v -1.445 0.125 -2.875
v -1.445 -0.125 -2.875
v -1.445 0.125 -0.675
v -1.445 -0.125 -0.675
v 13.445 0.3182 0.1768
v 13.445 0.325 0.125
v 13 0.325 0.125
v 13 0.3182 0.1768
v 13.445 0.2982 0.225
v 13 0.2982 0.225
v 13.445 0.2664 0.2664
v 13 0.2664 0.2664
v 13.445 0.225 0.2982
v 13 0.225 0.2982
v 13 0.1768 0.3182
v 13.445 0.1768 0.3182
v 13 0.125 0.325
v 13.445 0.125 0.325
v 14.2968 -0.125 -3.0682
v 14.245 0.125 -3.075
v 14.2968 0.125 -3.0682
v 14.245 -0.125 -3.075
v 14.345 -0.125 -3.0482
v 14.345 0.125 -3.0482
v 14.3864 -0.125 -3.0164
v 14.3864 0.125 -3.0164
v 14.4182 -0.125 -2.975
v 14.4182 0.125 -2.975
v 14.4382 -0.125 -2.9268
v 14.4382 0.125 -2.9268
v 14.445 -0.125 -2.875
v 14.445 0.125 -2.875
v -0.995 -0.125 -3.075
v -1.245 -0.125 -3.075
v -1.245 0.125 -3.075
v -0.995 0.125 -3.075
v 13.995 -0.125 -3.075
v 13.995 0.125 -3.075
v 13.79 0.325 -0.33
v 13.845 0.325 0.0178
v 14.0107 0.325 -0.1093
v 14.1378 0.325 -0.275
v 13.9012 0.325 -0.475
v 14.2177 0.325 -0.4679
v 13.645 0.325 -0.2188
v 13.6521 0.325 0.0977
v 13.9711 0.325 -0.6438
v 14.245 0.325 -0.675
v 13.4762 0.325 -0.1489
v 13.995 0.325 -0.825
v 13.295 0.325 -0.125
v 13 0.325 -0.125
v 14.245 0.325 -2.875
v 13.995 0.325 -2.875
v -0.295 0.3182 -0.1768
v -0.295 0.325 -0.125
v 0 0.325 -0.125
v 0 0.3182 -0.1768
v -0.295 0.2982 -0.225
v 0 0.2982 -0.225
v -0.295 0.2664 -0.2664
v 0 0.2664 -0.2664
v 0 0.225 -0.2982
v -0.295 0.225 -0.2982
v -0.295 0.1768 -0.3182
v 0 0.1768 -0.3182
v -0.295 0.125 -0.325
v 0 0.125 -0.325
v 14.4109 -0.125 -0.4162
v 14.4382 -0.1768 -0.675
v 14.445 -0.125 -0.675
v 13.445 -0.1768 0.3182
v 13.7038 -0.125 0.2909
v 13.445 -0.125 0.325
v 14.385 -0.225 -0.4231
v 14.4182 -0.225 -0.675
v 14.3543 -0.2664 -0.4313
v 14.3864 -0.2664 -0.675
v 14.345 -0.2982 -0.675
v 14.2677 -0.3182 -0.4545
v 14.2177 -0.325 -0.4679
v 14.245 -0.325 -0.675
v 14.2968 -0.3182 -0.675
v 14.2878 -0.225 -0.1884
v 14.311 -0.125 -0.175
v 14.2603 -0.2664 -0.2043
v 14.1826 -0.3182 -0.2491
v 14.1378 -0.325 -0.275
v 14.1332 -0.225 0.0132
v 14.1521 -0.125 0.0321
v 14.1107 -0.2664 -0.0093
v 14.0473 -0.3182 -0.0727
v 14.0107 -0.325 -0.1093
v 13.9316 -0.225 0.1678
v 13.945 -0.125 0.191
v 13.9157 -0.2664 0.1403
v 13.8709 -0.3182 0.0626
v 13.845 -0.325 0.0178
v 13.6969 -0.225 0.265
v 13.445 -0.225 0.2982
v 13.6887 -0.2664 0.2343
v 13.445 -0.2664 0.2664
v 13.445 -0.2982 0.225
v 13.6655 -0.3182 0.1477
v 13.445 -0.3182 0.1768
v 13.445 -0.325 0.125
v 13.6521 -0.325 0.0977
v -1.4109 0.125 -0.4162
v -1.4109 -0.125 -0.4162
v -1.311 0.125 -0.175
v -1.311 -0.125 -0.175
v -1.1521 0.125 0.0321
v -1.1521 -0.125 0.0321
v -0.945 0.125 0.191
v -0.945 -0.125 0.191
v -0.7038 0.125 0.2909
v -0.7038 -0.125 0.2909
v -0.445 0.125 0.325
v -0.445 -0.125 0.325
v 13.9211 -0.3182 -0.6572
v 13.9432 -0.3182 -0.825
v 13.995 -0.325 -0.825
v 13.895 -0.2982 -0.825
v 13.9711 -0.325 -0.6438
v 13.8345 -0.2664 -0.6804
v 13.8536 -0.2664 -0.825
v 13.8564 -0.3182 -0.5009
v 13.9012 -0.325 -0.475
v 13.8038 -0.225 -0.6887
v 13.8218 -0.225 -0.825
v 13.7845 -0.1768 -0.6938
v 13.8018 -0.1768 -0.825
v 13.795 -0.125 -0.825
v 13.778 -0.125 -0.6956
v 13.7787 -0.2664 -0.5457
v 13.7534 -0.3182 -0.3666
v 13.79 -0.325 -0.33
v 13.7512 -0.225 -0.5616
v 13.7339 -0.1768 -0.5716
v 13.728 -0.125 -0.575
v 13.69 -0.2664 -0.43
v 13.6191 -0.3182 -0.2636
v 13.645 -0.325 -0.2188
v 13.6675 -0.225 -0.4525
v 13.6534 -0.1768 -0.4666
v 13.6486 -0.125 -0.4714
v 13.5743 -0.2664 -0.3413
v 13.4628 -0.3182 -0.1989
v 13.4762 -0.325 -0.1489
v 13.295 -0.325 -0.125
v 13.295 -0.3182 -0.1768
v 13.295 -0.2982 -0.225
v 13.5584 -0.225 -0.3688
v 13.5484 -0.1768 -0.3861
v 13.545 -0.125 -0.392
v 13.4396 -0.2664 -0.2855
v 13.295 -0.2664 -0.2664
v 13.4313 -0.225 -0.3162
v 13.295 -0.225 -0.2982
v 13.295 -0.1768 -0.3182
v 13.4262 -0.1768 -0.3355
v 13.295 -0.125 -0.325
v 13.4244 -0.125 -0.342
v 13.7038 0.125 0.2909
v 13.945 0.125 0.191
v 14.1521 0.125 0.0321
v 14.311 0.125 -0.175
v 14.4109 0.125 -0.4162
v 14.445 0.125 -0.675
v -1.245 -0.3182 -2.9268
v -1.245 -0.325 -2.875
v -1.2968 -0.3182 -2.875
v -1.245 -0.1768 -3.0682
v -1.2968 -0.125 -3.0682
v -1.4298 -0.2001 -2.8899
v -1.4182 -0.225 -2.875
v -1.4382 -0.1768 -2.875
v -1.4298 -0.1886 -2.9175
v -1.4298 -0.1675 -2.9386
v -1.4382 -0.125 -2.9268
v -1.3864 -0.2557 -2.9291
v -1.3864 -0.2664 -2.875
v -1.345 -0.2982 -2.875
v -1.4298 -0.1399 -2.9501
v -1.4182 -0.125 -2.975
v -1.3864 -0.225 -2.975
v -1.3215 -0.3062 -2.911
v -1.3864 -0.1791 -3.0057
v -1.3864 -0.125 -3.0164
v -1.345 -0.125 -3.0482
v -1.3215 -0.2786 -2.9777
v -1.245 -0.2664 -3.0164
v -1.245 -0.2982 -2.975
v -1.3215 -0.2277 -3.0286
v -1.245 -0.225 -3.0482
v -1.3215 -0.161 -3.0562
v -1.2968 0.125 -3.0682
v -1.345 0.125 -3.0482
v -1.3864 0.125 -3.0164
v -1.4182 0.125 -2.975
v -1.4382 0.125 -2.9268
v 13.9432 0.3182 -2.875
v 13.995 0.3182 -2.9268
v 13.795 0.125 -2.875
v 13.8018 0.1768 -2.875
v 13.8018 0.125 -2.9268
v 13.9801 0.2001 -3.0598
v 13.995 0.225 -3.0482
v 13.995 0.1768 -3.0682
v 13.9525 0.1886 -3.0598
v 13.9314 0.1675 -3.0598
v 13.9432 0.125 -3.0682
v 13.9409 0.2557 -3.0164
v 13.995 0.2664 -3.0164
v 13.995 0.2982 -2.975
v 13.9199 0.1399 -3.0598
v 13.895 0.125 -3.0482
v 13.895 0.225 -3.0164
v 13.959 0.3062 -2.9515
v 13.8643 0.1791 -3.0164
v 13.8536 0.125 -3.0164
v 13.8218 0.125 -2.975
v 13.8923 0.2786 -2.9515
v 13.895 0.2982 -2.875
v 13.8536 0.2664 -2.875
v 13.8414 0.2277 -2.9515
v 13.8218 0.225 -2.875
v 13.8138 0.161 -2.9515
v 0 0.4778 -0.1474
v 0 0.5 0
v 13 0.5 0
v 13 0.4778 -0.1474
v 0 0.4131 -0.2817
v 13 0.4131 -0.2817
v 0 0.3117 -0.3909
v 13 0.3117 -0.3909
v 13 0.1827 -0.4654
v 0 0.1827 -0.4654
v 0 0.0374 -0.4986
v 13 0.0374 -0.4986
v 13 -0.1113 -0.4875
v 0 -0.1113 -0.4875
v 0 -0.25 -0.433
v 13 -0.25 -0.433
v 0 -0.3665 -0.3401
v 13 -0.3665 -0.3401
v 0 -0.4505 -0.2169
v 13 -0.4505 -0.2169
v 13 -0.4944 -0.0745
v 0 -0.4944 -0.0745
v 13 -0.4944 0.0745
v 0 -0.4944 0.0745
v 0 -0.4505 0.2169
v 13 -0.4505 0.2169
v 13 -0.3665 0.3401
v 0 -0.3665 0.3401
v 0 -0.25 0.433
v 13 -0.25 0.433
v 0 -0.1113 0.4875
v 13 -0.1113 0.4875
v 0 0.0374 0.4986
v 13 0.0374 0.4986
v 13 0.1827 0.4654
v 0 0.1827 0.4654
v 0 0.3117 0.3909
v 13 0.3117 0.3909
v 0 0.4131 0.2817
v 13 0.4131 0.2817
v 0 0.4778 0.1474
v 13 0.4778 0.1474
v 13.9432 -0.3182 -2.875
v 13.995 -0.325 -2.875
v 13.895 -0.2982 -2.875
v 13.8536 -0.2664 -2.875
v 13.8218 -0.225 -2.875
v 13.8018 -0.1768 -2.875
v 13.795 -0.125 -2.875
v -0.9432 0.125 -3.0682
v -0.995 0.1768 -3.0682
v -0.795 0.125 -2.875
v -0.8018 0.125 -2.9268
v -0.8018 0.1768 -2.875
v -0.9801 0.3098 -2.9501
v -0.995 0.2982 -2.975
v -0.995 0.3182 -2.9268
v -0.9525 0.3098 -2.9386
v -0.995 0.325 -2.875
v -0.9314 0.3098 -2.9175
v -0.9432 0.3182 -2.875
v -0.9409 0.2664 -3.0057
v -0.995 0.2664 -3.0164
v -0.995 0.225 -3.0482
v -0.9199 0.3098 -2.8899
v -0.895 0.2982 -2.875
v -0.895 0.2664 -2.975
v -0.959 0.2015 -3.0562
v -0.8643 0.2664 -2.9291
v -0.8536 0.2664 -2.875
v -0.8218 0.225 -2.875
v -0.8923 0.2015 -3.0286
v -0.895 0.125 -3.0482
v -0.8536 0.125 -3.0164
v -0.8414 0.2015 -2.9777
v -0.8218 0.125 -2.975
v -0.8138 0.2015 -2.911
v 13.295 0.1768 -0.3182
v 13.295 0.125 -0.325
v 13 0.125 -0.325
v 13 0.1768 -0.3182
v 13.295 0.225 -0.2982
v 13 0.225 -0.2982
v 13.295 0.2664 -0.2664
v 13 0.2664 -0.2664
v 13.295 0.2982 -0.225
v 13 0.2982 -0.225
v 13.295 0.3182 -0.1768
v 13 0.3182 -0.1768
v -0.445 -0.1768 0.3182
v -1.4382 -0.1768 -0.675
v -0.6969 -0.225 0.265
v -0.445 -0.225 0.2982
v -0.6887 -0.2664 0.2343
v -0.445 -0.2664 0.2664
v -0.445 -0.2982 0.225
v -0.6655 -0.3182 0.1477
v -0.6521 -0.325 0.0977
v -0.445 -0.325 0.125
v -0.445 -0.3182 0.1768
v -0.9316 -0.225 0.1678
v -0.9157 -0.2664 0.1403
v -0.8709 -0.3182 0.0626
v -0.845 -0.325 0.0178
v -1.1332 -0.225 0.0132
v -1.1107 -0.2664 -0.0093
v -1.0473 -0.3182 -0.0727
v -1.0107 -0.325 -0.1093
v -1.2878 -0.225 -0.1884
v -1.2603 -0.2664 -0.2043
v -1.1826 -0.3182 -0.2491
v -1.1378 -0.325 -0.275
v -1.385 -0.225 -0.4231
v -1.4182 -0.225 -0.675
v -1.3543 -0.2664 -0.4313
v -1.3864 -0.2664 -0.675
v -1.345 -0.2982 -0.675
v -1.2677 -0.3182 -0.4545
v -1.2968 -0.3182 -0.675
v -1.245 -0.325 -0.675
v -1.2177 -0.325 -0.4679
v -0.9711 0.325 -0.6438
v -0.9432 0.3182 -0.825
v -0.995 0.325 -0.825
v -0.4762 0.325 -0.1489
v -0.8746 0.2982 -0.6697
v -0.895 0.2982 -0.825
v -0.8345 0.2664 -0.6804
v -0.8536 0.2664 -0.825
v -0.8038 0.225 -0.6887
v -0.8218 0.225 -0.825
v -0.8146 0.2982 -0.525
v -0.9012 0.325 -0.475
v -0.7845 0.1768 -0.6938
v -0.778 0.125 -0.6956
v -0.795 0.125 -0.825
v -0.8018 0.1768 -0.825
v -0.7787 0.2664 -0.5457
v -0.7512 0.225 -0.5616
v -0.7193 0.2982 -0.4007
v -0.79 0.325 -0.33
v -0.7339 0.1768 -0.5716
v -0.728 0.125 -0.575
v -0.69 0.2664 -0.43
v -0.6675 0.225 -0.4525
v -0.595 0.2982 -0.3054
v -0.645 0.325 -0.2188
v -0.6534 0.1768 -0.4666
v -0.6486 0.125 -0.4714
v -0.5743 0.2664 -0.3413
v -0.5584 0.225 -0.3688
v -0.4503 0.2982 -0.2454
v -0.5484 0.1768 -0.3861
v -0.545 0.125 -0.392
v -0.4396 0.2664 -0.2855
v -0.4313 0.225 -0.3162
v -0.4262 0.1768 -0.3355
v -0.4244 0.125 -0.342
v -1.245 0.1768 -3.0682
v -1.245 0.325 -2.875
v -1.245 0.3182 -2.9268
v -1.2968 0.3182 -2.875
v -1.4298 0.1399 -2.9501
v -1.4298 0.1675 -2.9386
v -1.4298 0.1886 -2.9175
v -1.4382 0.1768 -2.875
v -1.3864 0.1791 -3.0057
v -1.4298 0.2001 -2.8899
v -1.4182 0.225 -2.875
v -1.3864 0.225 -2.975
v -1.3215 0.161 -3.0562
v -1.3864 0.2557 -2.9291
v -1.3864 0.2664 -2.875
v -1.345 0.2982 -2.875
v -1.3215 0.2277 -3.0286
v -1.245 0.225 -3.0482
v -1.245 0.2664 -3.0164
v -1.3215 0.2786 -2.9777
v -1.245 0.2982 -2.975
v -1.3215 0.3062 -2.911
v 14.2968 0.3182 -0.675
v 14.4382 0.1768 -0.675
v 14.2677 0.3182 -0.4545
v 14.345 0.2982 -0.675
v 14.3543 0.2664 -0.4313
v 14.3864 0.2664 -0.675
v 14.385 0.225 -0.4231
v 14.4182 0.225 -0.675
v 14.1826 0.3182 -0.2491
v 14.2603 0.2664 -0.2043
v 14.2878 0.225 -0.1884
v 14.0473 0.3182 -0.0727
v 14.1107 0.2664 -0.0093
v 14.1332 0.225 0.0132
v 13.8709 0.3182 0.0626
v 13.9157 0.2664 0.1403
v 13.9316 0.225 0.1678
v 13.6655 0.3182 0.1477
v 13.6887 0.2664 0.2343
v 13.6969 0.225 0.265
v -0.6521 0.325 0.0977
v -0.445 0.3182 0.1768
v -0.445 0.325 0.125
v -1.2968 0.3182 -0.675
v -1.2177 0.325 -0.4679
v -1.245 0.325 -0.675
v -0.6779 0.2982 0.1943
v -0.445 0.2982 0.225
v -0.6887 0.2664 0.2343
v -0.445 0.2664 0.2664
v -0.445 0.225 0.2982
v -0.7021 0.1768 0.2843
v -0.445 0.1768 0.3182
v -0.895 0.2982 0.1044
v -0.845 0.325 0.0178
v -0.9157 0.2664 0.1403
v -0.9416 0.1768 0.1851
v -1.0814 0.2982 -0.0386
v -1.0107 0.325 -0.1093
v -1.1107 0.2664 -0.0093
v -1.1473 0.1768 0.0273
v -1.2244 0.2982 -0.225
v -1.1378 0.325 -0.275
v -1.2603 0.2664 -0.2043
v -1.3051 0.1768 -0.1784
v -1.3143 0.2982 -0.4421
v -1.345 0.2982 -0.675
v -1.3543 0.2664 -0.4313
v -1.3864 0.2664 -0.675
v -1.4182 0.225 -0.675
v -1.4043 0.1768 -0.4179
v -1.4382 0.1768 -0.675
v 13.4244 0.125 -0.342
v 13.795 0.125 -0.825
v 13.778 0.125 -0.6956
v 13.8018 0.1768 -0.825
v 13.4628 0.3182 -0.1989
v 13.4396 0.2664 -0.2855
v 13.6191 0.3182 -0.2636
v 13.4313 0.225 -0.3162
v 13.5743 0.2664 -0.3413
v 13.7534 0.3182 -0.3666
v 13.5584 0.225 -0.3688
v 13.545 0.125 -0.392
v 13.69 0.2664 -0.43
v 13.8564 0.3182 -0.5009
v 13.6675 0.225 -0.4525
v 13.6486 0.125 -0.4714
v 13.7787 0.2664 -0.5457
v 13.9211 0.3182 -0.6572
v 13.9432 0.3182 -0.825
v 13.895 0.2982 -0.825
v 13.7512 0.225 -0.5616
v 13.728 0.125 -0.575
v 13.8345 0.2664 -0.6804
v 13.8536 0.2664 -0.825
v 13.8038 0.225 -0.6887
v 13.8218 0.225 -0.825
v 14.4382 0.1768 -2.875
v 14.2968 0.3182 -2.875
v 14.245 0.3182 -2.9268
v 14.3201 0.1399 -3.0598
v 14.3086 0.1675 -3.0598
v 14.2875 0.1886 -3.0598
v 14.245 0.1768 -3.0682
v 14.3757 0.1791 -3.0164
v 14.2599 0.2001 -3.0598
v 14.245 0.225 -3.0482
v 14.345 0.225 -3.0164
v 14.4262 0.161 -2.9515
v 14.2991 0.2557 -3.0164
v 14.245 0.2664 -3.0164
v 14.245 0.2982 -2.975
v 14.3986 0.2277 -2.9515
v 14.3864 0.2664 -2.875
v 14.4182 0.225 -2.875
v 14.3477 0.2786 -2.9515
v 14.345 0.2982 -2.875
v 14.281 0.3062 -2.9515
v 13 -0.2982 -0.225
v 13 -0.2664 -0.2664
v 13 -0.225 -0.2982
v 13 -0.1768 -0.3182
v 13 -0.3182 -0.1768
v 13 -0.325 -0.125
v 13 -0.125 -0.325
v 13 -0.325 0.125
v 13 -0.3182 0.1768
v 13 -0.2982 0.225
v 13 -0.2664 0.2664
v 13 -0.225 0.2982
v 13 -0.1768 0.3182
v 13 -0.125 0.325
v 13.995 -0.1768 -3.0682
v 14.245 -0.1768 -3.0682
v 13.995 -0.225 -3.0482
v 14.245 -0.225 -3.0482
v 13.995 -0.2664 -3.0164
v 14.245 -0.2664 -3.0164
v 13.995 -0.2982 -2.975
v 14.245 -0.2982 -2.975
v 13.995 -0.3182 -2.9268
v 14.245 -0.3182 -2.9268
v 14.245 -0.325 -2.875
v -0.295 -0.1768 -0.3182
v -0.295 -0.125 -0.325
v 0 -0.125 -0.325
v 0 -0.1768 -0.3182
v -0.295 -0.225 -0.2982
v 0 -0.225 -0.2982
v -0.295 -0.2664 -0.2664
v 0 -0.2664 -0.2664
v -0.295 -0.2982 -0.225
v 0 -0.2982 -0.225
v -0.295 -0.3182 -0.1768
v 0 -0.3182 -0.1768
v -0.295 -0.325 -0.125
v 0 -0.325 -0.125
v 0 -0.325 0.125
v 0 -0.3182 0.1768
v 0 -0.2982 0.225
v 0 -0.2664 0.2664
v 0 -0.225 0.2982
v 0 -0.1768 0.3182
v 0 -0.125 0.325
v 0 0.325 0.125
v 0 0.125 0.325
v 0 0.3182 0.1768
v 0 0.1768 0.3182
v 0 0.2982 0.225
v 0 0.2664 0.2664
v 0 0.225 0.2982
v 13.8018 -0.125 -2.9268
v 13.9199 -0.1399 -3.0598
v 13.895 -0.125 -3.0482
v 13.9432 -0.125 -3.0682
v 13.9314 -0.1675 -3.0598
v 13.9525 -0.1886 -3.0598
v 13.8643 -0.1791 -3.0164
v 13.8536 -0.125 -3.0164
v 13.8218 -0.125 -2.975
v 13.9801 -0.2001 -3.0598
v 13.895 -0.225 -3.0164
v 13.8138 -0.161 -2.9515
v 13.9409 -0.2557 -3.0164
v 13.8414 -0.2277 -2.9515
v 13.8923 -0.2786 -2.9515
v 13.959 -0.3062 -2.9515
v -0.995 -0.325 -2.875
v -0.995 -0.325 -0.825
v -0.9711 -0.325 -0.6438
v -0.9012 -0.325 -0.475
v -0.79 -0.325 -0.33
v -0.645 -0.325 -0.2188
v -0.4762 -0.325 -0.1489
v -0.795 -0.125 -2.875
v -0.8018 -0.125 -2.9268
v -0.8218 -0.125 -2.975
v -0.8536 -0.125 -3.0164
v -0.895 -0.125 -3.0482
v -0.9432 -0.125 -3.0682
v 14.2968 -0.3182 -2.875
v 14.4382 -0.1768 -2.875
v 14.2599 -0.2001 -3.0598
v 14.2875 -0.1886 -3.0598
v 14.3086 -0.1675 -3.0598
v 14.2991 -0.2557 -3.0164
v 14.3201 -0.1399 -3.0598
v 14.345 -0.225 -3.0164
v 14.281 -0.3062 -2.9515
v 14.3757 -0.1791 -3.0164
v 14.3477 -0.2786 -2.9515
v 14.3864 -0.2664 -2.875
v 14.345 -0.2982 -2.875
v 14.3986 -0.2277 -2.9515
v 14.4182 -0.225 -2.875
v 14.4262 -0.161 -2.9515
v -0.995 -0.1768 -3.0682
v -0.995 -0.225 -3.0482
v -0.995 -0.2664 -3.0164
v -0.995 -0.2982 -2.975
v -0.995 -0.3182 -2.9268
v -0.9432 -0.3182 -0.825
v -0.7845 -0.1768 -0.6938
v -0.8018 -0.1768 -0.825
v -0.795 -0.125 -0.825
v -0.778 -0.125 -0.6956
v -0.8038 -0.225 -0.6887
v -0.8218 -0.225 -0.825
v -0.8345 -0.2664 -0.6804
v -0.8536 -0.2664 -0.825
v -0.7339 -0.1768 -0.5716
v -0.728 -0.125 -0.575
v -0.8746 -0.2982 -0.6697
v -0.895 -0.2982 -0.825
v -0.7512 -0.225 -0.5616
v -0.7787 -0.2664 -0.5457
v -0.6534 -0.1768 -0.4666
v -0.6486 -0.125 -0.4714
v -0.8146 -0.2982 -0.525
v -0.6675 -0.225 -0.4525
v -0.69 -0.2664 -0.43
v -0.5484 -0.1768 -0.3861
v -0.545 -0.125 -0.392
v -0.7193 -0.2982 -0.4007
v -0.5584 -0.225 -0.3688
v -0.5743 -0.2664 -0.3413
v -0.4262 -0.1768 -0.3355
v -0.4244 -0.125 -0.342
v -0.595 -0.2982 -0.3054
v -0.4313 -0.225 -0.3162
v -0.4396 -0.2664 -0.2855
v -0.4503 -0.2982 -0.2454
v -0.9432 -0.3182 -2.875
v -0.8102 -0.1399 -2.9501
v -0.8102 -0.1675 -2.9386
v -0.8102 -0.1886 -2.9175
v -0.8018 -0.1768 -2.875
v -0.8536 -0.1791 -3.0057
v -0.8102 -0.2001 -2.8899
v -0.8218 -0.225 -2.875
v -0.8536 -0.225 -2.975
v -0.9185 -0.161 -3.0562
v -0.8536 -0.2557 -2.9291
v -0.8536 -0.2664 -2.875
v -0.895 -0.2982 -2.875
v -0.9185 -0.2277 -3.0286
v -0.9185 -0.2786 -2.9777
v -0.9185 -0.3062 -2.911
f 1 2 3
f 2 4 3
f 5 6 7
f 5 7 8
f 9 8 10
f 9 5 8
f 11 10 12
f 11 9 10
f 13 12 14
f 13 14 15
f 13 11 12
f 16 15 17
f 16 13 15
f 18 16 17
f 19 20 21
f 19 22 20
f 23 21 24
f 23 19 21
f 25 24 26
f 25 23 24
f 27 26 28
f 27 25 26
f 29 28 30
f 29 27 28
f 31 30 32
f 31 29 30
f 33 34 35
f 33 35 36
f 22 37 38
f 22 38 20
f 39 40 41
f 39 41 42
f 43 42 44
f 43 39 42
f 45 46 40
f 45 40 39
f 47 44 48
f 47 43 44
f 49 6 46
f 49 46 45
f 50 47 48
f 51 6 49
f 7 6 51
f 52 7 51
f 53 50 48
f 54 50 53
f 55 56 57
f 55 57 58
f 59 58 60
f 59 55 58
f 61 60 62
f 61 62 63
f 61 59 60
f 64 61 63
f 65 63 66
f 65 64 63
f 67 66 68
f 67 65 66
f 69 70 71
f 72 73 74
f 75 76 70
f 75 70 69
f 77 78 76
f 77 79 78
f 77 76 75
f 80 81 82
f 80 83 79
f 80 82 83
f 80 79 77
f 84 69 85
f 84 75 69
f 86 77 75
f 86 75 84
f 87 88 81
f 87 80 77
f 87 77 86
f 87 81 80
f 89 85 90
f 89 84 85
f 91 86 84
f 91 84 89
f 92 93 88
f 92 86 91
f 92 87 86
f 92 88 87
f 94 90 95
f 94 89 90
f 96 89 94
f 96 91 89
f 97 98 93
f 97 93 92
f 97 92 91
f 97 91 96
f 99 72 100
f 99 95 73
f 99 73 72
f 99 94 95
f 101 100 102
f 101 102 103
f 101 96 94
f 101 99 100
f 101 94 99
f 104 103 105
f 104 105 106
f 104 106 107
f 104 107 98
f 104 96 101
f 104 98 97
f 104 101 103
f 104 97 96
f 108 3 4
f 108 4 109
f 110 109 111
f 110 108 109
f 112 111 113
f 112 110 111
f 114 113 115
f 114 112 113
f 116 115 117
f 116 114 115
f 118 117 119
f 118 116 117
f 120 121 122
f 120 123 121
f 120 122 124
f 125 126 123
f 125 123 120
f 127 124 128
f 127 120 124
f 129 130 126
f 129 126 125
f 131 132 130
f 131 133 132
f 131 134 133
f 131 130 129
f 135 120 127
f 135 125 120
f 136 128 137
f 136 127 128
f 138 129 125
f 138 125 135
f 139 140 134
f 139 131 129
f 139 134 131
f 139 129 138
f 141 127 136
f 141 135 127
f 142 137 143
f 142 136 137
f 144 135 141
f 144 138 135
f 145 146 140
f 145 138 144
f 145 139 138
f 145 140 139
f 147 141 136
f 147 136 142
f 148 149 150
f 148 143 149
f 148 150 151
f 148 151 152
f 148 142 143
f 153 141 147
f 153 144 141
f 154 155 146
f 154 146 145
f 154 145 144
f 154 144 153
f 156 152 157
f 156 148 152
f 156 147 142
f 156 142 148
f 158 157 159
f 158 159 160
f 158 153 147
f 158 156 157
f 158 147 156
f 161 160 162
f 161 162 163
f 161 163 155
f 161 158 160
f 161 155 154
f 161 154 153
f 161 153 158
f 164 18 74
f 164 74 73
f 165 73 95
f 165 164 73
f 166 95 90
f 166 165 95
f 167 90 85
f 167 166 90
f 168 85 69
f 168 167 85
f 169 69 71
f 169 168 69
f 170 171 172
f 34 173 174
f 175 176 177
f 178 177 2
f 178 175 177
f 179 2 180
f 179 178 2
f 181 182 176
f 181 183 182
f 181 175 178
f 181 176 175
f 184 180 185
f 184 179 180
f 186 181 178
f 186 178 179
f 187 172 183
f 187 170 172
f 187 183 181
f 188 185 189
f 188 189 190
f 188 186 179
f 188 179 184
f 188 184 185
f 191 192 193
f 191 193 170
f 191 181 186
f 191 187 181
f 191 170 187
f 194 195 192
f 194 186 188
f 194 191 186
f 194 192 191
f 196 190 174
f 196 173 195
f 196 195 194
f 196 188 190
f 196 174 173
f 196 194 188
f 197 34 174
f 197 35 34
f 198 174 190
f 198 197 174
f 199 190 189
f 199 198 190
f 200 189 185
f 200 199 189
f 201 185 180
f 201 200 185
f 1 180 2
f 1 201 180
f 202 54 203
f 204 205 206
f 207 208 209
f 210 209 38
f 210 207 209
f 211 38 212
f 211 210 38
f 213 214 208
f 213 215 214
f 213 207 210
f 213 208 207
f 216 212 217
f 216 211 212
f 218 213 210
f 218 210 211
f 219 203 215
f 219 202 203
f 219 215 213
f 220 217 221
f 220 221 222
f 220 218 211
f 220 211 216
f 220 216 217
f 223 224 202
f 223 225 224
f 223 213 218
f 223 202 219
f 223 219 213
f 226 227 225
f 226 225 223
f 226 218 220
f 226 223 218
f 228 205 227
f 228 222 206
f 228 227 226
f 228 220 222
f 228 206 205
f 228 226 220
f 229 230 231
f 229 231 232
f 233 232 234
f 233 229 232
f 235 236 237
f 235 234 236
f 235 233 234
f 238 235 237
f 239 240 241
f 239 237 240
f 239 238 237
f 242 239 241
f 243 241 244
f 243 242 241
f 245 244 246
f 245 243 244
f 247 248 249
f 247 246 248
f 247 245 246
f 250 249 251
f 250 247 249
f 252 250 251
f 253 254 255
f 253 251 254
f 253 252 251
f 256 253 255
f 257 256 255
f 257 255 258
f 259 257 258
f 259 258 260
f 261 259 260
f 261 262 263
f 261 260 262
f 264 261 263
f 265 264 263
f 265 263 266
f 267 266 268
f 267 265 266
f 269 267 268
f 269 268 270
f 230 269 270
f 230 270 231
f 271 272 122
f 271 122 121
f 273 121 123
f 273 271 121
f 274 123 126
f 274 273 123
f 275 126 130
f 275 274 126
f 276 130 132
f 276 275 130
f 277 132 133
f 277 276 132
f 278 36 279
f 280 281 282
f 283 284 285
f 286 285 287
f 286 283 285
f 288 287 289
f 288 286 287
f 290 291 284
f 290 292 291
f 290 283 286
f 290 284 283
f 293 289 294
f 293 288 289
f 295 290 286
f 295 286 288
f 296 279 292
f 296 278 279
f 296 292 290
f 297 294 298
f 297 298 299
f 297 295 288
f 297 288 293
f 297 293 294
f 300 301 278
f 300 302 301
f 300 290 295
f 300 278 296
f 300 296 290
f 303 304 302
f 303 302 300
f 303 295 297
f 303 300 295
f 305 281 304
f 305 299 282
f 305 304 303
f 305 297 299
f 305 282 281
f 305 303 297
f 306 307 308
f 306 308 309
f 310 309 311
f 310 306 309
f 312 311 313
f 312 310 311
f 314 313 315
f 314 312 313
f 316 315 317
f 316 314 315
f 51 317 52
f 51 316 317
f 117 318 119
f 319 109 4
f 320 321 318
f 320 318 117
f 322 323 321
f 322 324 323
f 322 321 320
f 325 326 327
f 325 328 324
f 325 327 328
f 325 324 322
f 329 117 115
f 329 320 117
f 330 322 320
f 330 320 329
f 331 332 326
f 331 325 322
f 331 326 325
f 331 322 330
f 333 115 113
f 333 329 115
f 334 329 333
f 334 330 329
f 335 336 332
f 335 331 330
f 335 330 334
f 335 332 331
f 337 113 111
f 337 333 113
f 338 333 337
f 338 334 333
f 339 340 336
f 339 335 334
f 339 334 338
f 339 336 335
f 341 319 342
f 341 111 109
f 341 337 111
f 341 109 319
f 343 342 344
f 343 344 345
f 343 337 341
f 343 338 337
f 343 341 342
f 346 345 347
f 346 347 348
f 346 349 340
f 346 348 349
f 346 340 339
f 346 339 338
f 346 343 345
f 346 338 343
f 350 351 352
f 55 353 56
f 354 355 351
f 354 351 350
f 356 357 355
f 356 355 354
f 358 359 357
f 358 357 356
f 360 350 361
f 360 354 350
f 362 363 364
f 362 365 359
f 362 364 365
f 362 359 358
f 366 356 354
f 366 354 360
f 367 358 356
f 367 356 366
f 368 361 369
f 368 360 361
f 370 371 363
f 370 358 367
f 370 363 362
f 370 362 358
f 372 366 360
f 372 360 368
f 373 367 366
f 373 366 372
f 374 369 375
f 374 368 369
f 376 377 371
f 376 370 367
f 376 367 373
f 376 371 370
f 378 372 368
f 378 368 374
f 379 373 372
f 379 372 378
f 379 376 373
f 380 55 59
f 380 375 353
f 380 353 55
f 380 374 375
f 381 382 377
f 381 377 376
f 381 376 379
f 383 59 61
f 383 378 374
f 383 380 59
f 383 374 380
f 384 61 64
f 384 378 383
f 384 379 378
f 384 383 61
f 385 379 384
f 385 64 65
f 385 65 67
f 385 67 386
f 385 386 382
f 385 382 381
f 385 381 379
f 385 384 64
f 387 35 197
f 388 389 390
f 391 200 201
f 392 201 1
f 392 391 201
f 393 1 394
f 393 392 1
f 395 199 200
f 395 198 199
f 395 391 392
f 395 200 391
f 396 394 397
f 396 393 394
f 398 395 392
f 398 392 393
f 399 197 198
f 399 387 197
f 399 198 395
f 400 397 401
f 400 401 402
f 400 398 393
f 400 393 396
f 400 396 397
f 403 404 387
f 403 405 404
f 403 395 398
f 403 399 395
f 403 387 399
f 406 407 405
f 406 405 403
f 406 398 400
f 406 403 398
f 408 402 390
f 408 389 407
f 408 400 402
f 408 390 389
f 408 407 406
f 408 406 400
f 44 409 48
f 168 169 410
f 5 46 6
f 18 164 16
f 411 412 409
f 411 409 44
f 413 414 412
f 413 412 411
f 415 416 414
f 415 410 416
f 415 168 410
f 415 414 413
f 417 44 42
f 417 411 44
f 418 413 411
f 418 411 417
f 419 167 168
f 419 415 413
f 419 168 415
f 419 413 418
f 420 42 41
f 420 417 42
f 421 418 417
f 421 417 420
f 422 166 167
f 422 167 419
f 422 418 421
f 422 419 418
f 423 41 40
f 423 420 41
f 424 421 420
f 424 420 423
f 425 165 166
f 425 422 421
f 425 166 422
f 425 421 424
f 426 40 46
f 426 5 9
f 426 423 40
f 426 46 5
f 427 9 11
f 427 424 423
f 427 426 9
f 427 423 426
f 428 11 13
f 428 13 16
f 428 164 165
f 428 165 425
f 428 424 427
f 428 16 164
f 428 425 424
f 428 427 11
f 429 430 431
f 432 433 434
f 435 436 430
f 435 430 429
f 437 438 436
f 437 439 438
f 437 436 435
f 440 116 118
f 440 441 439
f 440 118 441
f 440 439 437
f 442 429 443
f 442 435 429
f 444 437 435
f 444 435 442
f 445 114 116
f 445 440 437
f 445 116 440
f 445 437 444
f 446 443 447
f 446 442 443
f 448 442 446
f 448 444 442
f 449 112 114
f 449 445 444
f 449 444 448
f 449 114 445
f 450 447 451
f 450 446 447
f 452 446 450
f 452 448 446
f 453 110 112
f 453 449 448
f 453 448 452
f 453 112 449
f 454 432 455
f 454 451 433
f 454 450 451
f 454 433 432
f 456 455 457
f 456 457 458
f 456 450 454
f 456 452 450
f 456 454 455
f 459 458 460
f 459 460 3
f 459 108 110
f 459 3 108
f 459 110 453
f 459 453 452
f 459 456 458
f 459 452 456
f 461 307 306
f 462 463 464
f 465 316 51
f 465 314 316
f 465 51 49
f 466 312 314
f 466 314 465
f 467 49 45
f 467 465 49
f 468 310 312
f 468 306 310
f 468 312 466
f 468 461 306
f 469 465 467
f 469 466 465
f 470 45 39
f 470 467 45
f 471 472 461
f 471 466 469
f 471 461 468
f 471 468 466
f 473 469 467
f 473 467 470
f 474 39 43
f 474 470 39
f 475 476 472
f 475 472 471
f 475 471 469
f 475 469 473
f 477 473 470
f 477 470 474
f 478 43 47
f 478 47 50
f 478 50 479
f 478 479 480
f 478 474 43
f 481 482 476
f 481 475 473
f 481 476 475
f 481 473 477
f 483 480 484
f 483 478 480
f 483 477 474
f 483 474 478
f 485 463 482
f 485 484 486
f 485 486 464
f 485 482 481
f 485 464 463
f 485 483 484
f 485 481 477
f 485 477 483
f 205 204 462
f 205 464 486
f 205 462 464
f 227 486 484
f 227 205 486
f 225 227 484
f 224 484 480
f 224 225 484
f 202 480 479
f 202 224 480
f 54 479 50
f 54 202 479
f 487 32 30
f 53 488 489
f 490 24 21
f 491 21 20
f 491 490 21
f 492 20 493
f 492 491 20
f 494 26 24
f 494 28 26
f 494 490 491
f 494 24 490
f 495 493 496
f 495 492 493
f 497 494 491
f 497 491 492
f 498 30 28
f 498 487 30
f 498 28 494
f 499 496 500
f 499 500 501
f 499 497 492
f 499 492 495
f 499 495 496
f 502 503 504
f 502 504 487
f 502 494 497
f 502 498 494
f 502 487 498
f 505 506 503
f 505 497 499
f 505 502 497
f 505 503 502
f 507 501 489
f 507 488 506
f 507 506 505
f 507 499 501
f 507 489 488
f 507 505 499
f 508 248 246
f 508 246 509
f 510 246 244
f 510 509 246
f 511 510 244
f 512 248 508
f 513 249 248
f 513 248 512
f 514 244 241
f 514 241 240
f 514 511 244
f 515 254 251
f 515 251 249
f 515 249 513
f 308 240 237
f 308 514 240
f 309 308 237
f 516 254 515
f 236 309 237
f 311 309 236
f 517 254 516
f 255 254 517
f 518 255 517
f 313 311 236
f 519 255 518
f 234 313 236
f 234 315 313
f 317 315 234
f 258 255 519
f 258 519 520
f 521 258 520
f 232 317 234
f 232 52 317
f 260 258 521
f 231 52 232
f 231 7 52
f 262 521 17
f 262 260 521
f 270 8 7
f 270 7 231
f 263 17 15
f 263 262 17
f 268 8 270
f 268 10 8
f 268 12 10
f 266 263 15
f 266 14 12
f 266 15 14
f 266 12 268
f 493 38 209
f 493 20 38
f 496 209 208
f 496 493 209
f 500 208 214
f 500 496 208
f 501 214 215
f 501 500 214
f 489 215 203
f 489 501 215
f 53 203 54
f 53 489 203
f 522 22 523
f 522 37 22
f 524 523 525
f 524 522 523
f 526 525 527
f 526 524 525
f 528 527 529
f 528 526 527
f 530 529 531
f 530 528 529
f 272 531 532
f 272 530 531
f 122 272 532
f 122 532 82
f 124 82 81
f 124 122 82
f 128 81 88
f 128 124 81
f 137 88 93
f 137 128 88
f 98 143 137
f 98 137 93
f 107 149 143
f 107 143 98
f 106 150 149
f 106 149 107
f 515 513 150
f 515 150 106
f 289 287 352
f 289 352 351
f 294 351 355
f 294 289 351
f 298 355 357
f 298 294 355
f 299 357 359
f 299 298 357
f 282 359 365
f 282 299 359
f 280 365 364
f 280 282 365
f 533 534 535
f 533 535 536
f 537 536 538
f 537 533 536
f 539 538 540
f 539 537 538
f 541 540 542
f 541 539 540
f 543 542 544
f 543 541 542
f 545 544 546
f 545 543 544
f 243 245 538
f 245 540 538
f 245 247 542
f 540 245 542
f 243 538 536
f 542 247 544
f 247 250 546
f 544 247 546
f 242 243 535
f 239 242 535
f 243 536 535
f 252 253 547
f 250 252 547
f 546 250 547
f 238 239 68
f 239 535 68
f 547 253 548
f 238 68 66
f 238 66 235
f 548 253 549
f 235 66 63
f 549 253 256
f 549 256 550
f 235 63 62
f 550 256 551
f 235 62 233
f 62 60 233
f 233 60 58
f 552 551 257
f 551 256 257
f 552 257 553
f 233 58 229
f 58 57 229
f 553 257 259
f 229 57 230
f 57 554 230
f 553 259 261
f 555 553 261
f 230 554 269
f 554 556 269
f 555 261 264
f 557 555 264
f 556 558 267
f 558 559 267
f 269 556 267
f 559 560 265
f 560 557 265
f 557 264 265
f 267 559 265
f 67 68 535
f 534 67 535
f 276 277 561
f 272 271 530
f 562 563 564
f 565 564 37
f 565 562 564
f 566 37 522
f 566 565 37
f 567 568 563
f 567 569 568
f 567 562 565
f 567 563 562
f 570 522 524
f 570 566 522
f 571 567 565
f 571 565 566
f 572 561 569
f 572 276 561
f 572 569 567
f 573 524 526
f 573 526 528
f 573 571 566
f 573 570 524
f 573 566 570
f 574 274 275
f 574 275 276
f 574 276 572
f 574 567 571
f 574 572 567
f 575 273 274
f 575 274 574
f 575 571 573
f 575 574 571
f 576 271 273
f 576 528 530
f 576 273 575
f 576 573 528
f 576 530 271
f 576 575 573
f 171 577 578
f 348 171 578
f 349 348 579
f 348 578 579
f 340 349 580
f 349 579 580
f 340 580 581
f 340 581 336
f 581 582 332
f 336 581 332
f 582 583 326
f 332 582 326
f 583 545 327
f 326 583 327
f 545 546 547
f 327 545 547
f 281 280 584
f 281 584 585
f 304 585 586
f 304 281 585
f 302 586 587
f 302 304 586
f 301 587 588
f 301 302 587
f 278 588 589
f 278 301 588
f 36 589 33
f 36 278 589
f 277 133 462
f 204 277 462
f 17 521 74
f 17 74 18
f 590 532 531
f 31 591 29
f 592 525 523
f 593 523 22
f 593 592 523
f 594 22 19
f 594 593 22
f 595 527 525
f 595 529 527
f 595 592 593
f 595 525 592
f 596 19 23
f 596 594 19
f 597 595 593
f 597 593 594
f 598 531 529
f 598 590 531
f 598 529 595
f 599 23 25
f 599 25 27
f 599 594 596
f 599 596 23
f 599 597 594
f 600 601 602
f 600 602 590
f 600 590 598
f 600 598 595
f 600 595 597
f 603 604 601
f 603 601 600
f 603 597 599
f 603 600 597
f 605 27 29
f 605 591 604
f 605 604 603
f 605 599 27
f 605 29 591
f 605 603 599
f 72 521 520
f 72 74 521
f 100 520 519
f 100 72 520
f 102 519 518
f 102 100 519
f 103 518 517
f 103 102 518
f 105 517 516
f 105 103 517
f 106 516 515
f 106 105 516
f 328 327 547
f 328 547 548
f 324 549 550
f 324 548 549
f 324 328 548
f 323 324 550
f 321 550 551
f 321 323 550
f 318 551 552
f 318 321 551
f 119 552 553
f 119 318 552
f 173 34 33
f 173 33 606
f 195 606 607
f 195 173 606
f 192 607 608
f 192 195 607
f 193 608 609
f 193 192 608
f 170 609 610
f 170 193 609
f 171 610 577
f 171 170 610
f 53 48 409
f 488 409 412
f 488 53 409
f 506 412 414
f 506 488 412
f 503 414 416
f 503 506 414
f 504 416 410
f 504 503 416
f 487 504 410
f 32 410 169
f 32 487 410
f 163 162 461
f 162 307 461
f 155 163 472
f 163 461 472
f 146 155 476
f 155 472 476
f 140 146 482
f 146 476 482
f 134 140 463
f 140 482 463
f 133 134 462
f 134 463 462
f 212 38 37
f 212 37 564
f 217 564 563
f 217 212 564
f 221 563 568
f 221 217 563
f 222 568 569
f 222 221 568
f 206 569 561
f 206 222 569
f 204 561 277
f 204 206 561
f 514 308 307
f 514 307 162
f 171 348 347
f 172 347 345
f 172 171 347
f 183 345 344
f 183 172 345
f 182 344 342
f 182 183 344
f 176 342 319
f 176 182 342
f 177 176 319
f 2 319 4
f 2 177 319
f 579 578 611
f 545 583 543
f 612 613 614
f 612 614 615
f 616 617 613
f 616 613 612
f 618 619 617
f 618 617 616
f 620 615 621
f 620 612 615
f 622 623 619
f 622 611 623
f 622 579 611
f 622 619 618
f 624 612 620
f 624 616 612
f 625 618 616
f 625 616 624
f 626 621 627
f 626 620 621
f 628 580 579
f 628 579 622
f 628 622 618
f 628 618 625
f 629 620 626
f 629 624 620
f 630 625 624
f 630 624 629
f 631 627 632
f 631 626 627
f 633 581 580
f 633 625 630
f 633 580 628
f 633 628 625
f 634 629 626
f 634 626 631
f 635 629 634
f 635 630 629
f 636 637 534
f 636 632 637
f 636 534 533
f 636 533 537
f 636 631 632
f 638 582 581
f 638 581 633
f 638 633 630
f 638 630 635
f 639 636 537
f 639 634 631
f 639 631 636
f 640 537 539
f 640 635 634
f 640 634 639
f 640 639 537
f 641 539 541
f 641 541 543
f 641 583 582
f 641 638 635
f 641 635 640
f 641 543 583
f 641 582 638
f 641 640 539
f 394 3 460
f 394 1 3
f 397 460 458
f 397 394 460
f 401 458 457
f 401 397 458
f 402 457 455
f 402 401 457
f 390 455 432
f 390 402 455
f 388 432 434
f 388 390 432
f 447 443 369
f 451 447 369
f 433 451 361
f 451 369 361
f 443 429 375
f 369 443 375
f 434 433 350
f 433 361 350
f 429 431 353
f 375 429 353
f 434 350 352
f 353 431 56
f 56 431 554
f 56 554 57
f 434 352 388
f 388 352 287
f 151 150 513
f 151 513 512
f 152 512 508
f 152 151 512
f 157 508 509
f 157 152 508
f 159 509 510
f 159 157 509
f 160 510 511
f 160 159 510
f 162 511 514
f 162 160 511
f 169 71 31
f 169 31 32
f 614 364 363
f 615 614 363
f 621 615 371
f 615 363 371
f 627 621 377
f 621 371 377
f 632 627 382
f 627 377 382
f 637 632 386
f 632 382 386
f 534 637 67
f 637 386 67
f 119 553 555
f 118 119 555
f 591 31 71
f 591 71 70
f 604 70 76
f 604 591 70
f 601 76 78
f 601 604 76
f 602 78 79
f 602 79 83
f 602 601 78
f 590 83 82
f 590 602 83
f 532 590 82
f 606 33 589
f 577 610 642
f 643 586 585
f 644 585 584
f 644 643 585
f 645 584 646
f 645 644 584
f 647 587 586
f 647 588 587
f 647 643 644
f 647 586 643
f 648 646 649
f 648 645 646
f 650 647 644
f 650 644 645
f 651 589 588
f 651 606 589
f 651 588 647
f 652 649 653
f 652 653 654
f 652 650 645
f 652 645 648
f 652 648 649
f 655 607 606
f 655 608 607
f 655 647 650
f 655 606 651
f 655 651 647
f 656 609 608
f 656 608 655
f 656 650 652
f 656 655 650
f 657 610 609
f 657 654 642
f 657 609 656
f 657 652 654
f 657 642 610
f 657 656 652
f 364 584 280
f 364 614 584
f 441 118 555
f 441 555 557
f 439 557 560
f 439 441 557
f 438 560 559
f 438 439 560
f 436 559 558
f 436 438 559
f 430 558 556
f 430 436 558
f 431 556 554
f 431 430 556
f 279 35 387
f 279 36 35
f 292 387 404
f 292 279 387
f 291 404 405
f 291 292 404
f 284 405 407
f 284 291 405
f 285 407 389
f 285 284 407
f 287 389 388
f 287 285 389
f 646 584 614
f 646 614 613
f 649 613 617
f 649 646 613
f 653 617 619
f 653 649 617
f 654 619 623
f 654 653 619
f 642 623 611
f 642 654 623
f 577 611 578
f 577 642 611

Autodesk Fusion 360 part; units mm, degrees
sketch "Sketch1" plane through (0, 0, 0) normal (1, 0, 0) x (0, 1, 0)
  circle A0 centre (0, 0) radius 0.5
  line L0 (0.325, -0.325) -> (-0.325, -0.325)
  line L1 (-0.325, -0.325) -> (-0.325, 0.325)
  line L2 (-0.325, 0.325) -> (0.325, 0.325)
  line L3 (0.325, 0.325) -> (0.325, -0.325)
  line L4 (0.325, -0.325) -> (-0.325, 0.325) construction
  line L5 (-0.325, -0.325) -> (0.325, 0.325) construction
  dimension "d1" = 1
  dimension "d2" = 0.65
  dimension "d3" = 0.65
extrude "Extrude1" add sketch "Sketch1" along normal blind 13 contours A0 | L0 L1 L2 L3
sketch "Sketch2" plane through (13, 0, 0) normal (1, 0, 0) x (0, 1, 0)
  circle A0 centre (0, 0) radius 0.5
  line L0 (0.325, -0.325) -> (-0.325, -0.325)
  line L1 (-0.325, -0.325) -> (-0.325, 0.325)
  line L2 (-0.325, 0.325) -> (0.325, 0.325)
  line L3 (0.325, 0.325) -> (0.325, -0.325)
  line L4 (0.325, -0.325) -> (-0.325, 0.325) construction
  line L5 (-0.325, -0.325) -> (0.325, 0.325) construction
  dimension "d8" = 0.65
  dimension "d9" = 0.65
extrude "Extrude2" add sketch "Sketch2" along normal blind 1.445 contours L0 L1 L2 L3
extrude "Extrude3" add sketch "Sketch1" against normal blind 1.445 contours L0 L1 L2 L3
sketch "Sketch3" plane through (0, 0, -0.325) normal (0, 0, -1) x (1, 0, 0)
  line L0 (13, 0.325) -> (13, -0.325)
  line L1 (13, -0.325) -> (14.445, -0.325)
  line L2 (14.445, -0.325) -> (14.445, 0.325)
  line L3 (14.445, 0.325) -> (13, 0.325)
  line L4 (14.445, 0.325) -> (13.795, 0.325)
  line L5 (13.795, 0.325) -> (13.795, -0.325)
  line L6 (13.795, -0.325) -> (14.445, -0.325)
  line L7 (14.445, -0.325) -> (14.445, 0.325)
  line L8 (14.445, 0.325) -> (13.795, -0.325) construction
  line L9 (13.795, 0.325) -> (14.445, -0.325) construction
  point P0 (14.12, 0)
  dimension "d14" = 0.65
  dimension "d15" = 0.65
sketch "Sketch4" plane through (0, 0, -0.325) normal (0, 0, -1) x (1, 0, 0)
  line L0 (0, -0.325) -> (0, 0.325)
  line L1 (0, 0.325) -> (-1.445, 0.325)
  line L2 (-1.445, 0.325) -> (-1.445, -0.325)
  line L3 (-1.445, -0.325) -> (0, -0.325)
  line L4 (-0.795, -0.325) -> (-1.445, -0.325)
  line L5 (-1.445, -0.325) -> (-1.445, 0.325)
  line L6 (-1.445, 0.325) -> (-0.795, 0.325)
  line L7 (-0.795, 0.325) -> (-0.795, -0.325)
  line L8 (-0.795, -0.325) -> (-1.445, 0.325) construction
  line L9 (-1.445, -0.325) -> (-0.795, 0.325) construction
  point P0 (-1.12, 0)
  dimension "d17" = 0.65
  dimension "d18" = 0.65
extrude "Extrude4" add sketch "Sketch4" sketch "Sketch3" along normal blind 2.75 contours L1 L2 L3 L4 L5 L6 L7 of sketch 2 contours L1 L2 L3 L4 L5 L6 L7
fillet "Fillet1" radius 0.5 2 edges at (-0.795, 0, -0.325) (13.795, 0, -0.325)
fillet "Fillet2" radius 1 2 edges at (-1.445, 0, 0.325) (14.445, 0, 0.325)
fillet "Fillet3" radius 0.2 28 edges at (-1.12, -0.325, -3.075) (-0.795, 0, -3.075) (-1.12, 0.325, -3.075) (-1.445, 0, -3.075) (-0.6486, -0.325, -0.4714) (-0.795, -0.325, -1.95) (-0.2225, -0.325, 0.325) (-1.1521, -0.325, 0.0321) (-1.445, -0.325, -1.875) (-0.2225, 0.325, 0.325) (-1.1521, 0.325, 0.0321) (-1.445, 0.325, -1.875) (-0.6486, 0.325, -0.4714) (-0.795, 0.325, -1.95) (13.2225, -0.325, 0.325) (14.1521, -0.325, 0.0321) (14.445, -0.325, -1.875) (13.795, -0.325, -1.95) (13.6486, -0.325, -0.4714) (14.445, 0.325, -1.875) (14.1521, 0.325, 0.0321) (13.2225, 0.325, 0.325) (13.6486, 0.325, -0.4714) (13.795, 0.325, -1.95) (14.12, 0.325, -3.075) (14.445, 0, -3.075) (14.12, -0.325, -3.075) (13.795, 0, -3.075)
equation "d1 = width"
equation "d2 = d3"
equation "d3 = d1 * 0.65"
equation "width = 1 mm"
equation "baseLenght = 13 mm"
equation "d6 = baseLenght"
equation "d8 = width * 0.65"
equation "d9 = d8"
equation "d10 = ( ( 2.54 * ceil(( baseLenght + 1.3 * width ) / 2.54 mm) ) * 1 mm + 0.65 * width - baseLenght ) / 2"
equation "d12 = -( ( 2.54 * ceil(( baseLenght + 1.3 * width ) / 2.54 mm) ) * 1 mm + 0.65 * width - baseLenght ) / 2"
equation "d14 = width * 0.65"
equation "d15 = d14"
equation "d17 = width * 0.65"
equation "d18 = d17"
equation "d26 = 0.2 * width"
